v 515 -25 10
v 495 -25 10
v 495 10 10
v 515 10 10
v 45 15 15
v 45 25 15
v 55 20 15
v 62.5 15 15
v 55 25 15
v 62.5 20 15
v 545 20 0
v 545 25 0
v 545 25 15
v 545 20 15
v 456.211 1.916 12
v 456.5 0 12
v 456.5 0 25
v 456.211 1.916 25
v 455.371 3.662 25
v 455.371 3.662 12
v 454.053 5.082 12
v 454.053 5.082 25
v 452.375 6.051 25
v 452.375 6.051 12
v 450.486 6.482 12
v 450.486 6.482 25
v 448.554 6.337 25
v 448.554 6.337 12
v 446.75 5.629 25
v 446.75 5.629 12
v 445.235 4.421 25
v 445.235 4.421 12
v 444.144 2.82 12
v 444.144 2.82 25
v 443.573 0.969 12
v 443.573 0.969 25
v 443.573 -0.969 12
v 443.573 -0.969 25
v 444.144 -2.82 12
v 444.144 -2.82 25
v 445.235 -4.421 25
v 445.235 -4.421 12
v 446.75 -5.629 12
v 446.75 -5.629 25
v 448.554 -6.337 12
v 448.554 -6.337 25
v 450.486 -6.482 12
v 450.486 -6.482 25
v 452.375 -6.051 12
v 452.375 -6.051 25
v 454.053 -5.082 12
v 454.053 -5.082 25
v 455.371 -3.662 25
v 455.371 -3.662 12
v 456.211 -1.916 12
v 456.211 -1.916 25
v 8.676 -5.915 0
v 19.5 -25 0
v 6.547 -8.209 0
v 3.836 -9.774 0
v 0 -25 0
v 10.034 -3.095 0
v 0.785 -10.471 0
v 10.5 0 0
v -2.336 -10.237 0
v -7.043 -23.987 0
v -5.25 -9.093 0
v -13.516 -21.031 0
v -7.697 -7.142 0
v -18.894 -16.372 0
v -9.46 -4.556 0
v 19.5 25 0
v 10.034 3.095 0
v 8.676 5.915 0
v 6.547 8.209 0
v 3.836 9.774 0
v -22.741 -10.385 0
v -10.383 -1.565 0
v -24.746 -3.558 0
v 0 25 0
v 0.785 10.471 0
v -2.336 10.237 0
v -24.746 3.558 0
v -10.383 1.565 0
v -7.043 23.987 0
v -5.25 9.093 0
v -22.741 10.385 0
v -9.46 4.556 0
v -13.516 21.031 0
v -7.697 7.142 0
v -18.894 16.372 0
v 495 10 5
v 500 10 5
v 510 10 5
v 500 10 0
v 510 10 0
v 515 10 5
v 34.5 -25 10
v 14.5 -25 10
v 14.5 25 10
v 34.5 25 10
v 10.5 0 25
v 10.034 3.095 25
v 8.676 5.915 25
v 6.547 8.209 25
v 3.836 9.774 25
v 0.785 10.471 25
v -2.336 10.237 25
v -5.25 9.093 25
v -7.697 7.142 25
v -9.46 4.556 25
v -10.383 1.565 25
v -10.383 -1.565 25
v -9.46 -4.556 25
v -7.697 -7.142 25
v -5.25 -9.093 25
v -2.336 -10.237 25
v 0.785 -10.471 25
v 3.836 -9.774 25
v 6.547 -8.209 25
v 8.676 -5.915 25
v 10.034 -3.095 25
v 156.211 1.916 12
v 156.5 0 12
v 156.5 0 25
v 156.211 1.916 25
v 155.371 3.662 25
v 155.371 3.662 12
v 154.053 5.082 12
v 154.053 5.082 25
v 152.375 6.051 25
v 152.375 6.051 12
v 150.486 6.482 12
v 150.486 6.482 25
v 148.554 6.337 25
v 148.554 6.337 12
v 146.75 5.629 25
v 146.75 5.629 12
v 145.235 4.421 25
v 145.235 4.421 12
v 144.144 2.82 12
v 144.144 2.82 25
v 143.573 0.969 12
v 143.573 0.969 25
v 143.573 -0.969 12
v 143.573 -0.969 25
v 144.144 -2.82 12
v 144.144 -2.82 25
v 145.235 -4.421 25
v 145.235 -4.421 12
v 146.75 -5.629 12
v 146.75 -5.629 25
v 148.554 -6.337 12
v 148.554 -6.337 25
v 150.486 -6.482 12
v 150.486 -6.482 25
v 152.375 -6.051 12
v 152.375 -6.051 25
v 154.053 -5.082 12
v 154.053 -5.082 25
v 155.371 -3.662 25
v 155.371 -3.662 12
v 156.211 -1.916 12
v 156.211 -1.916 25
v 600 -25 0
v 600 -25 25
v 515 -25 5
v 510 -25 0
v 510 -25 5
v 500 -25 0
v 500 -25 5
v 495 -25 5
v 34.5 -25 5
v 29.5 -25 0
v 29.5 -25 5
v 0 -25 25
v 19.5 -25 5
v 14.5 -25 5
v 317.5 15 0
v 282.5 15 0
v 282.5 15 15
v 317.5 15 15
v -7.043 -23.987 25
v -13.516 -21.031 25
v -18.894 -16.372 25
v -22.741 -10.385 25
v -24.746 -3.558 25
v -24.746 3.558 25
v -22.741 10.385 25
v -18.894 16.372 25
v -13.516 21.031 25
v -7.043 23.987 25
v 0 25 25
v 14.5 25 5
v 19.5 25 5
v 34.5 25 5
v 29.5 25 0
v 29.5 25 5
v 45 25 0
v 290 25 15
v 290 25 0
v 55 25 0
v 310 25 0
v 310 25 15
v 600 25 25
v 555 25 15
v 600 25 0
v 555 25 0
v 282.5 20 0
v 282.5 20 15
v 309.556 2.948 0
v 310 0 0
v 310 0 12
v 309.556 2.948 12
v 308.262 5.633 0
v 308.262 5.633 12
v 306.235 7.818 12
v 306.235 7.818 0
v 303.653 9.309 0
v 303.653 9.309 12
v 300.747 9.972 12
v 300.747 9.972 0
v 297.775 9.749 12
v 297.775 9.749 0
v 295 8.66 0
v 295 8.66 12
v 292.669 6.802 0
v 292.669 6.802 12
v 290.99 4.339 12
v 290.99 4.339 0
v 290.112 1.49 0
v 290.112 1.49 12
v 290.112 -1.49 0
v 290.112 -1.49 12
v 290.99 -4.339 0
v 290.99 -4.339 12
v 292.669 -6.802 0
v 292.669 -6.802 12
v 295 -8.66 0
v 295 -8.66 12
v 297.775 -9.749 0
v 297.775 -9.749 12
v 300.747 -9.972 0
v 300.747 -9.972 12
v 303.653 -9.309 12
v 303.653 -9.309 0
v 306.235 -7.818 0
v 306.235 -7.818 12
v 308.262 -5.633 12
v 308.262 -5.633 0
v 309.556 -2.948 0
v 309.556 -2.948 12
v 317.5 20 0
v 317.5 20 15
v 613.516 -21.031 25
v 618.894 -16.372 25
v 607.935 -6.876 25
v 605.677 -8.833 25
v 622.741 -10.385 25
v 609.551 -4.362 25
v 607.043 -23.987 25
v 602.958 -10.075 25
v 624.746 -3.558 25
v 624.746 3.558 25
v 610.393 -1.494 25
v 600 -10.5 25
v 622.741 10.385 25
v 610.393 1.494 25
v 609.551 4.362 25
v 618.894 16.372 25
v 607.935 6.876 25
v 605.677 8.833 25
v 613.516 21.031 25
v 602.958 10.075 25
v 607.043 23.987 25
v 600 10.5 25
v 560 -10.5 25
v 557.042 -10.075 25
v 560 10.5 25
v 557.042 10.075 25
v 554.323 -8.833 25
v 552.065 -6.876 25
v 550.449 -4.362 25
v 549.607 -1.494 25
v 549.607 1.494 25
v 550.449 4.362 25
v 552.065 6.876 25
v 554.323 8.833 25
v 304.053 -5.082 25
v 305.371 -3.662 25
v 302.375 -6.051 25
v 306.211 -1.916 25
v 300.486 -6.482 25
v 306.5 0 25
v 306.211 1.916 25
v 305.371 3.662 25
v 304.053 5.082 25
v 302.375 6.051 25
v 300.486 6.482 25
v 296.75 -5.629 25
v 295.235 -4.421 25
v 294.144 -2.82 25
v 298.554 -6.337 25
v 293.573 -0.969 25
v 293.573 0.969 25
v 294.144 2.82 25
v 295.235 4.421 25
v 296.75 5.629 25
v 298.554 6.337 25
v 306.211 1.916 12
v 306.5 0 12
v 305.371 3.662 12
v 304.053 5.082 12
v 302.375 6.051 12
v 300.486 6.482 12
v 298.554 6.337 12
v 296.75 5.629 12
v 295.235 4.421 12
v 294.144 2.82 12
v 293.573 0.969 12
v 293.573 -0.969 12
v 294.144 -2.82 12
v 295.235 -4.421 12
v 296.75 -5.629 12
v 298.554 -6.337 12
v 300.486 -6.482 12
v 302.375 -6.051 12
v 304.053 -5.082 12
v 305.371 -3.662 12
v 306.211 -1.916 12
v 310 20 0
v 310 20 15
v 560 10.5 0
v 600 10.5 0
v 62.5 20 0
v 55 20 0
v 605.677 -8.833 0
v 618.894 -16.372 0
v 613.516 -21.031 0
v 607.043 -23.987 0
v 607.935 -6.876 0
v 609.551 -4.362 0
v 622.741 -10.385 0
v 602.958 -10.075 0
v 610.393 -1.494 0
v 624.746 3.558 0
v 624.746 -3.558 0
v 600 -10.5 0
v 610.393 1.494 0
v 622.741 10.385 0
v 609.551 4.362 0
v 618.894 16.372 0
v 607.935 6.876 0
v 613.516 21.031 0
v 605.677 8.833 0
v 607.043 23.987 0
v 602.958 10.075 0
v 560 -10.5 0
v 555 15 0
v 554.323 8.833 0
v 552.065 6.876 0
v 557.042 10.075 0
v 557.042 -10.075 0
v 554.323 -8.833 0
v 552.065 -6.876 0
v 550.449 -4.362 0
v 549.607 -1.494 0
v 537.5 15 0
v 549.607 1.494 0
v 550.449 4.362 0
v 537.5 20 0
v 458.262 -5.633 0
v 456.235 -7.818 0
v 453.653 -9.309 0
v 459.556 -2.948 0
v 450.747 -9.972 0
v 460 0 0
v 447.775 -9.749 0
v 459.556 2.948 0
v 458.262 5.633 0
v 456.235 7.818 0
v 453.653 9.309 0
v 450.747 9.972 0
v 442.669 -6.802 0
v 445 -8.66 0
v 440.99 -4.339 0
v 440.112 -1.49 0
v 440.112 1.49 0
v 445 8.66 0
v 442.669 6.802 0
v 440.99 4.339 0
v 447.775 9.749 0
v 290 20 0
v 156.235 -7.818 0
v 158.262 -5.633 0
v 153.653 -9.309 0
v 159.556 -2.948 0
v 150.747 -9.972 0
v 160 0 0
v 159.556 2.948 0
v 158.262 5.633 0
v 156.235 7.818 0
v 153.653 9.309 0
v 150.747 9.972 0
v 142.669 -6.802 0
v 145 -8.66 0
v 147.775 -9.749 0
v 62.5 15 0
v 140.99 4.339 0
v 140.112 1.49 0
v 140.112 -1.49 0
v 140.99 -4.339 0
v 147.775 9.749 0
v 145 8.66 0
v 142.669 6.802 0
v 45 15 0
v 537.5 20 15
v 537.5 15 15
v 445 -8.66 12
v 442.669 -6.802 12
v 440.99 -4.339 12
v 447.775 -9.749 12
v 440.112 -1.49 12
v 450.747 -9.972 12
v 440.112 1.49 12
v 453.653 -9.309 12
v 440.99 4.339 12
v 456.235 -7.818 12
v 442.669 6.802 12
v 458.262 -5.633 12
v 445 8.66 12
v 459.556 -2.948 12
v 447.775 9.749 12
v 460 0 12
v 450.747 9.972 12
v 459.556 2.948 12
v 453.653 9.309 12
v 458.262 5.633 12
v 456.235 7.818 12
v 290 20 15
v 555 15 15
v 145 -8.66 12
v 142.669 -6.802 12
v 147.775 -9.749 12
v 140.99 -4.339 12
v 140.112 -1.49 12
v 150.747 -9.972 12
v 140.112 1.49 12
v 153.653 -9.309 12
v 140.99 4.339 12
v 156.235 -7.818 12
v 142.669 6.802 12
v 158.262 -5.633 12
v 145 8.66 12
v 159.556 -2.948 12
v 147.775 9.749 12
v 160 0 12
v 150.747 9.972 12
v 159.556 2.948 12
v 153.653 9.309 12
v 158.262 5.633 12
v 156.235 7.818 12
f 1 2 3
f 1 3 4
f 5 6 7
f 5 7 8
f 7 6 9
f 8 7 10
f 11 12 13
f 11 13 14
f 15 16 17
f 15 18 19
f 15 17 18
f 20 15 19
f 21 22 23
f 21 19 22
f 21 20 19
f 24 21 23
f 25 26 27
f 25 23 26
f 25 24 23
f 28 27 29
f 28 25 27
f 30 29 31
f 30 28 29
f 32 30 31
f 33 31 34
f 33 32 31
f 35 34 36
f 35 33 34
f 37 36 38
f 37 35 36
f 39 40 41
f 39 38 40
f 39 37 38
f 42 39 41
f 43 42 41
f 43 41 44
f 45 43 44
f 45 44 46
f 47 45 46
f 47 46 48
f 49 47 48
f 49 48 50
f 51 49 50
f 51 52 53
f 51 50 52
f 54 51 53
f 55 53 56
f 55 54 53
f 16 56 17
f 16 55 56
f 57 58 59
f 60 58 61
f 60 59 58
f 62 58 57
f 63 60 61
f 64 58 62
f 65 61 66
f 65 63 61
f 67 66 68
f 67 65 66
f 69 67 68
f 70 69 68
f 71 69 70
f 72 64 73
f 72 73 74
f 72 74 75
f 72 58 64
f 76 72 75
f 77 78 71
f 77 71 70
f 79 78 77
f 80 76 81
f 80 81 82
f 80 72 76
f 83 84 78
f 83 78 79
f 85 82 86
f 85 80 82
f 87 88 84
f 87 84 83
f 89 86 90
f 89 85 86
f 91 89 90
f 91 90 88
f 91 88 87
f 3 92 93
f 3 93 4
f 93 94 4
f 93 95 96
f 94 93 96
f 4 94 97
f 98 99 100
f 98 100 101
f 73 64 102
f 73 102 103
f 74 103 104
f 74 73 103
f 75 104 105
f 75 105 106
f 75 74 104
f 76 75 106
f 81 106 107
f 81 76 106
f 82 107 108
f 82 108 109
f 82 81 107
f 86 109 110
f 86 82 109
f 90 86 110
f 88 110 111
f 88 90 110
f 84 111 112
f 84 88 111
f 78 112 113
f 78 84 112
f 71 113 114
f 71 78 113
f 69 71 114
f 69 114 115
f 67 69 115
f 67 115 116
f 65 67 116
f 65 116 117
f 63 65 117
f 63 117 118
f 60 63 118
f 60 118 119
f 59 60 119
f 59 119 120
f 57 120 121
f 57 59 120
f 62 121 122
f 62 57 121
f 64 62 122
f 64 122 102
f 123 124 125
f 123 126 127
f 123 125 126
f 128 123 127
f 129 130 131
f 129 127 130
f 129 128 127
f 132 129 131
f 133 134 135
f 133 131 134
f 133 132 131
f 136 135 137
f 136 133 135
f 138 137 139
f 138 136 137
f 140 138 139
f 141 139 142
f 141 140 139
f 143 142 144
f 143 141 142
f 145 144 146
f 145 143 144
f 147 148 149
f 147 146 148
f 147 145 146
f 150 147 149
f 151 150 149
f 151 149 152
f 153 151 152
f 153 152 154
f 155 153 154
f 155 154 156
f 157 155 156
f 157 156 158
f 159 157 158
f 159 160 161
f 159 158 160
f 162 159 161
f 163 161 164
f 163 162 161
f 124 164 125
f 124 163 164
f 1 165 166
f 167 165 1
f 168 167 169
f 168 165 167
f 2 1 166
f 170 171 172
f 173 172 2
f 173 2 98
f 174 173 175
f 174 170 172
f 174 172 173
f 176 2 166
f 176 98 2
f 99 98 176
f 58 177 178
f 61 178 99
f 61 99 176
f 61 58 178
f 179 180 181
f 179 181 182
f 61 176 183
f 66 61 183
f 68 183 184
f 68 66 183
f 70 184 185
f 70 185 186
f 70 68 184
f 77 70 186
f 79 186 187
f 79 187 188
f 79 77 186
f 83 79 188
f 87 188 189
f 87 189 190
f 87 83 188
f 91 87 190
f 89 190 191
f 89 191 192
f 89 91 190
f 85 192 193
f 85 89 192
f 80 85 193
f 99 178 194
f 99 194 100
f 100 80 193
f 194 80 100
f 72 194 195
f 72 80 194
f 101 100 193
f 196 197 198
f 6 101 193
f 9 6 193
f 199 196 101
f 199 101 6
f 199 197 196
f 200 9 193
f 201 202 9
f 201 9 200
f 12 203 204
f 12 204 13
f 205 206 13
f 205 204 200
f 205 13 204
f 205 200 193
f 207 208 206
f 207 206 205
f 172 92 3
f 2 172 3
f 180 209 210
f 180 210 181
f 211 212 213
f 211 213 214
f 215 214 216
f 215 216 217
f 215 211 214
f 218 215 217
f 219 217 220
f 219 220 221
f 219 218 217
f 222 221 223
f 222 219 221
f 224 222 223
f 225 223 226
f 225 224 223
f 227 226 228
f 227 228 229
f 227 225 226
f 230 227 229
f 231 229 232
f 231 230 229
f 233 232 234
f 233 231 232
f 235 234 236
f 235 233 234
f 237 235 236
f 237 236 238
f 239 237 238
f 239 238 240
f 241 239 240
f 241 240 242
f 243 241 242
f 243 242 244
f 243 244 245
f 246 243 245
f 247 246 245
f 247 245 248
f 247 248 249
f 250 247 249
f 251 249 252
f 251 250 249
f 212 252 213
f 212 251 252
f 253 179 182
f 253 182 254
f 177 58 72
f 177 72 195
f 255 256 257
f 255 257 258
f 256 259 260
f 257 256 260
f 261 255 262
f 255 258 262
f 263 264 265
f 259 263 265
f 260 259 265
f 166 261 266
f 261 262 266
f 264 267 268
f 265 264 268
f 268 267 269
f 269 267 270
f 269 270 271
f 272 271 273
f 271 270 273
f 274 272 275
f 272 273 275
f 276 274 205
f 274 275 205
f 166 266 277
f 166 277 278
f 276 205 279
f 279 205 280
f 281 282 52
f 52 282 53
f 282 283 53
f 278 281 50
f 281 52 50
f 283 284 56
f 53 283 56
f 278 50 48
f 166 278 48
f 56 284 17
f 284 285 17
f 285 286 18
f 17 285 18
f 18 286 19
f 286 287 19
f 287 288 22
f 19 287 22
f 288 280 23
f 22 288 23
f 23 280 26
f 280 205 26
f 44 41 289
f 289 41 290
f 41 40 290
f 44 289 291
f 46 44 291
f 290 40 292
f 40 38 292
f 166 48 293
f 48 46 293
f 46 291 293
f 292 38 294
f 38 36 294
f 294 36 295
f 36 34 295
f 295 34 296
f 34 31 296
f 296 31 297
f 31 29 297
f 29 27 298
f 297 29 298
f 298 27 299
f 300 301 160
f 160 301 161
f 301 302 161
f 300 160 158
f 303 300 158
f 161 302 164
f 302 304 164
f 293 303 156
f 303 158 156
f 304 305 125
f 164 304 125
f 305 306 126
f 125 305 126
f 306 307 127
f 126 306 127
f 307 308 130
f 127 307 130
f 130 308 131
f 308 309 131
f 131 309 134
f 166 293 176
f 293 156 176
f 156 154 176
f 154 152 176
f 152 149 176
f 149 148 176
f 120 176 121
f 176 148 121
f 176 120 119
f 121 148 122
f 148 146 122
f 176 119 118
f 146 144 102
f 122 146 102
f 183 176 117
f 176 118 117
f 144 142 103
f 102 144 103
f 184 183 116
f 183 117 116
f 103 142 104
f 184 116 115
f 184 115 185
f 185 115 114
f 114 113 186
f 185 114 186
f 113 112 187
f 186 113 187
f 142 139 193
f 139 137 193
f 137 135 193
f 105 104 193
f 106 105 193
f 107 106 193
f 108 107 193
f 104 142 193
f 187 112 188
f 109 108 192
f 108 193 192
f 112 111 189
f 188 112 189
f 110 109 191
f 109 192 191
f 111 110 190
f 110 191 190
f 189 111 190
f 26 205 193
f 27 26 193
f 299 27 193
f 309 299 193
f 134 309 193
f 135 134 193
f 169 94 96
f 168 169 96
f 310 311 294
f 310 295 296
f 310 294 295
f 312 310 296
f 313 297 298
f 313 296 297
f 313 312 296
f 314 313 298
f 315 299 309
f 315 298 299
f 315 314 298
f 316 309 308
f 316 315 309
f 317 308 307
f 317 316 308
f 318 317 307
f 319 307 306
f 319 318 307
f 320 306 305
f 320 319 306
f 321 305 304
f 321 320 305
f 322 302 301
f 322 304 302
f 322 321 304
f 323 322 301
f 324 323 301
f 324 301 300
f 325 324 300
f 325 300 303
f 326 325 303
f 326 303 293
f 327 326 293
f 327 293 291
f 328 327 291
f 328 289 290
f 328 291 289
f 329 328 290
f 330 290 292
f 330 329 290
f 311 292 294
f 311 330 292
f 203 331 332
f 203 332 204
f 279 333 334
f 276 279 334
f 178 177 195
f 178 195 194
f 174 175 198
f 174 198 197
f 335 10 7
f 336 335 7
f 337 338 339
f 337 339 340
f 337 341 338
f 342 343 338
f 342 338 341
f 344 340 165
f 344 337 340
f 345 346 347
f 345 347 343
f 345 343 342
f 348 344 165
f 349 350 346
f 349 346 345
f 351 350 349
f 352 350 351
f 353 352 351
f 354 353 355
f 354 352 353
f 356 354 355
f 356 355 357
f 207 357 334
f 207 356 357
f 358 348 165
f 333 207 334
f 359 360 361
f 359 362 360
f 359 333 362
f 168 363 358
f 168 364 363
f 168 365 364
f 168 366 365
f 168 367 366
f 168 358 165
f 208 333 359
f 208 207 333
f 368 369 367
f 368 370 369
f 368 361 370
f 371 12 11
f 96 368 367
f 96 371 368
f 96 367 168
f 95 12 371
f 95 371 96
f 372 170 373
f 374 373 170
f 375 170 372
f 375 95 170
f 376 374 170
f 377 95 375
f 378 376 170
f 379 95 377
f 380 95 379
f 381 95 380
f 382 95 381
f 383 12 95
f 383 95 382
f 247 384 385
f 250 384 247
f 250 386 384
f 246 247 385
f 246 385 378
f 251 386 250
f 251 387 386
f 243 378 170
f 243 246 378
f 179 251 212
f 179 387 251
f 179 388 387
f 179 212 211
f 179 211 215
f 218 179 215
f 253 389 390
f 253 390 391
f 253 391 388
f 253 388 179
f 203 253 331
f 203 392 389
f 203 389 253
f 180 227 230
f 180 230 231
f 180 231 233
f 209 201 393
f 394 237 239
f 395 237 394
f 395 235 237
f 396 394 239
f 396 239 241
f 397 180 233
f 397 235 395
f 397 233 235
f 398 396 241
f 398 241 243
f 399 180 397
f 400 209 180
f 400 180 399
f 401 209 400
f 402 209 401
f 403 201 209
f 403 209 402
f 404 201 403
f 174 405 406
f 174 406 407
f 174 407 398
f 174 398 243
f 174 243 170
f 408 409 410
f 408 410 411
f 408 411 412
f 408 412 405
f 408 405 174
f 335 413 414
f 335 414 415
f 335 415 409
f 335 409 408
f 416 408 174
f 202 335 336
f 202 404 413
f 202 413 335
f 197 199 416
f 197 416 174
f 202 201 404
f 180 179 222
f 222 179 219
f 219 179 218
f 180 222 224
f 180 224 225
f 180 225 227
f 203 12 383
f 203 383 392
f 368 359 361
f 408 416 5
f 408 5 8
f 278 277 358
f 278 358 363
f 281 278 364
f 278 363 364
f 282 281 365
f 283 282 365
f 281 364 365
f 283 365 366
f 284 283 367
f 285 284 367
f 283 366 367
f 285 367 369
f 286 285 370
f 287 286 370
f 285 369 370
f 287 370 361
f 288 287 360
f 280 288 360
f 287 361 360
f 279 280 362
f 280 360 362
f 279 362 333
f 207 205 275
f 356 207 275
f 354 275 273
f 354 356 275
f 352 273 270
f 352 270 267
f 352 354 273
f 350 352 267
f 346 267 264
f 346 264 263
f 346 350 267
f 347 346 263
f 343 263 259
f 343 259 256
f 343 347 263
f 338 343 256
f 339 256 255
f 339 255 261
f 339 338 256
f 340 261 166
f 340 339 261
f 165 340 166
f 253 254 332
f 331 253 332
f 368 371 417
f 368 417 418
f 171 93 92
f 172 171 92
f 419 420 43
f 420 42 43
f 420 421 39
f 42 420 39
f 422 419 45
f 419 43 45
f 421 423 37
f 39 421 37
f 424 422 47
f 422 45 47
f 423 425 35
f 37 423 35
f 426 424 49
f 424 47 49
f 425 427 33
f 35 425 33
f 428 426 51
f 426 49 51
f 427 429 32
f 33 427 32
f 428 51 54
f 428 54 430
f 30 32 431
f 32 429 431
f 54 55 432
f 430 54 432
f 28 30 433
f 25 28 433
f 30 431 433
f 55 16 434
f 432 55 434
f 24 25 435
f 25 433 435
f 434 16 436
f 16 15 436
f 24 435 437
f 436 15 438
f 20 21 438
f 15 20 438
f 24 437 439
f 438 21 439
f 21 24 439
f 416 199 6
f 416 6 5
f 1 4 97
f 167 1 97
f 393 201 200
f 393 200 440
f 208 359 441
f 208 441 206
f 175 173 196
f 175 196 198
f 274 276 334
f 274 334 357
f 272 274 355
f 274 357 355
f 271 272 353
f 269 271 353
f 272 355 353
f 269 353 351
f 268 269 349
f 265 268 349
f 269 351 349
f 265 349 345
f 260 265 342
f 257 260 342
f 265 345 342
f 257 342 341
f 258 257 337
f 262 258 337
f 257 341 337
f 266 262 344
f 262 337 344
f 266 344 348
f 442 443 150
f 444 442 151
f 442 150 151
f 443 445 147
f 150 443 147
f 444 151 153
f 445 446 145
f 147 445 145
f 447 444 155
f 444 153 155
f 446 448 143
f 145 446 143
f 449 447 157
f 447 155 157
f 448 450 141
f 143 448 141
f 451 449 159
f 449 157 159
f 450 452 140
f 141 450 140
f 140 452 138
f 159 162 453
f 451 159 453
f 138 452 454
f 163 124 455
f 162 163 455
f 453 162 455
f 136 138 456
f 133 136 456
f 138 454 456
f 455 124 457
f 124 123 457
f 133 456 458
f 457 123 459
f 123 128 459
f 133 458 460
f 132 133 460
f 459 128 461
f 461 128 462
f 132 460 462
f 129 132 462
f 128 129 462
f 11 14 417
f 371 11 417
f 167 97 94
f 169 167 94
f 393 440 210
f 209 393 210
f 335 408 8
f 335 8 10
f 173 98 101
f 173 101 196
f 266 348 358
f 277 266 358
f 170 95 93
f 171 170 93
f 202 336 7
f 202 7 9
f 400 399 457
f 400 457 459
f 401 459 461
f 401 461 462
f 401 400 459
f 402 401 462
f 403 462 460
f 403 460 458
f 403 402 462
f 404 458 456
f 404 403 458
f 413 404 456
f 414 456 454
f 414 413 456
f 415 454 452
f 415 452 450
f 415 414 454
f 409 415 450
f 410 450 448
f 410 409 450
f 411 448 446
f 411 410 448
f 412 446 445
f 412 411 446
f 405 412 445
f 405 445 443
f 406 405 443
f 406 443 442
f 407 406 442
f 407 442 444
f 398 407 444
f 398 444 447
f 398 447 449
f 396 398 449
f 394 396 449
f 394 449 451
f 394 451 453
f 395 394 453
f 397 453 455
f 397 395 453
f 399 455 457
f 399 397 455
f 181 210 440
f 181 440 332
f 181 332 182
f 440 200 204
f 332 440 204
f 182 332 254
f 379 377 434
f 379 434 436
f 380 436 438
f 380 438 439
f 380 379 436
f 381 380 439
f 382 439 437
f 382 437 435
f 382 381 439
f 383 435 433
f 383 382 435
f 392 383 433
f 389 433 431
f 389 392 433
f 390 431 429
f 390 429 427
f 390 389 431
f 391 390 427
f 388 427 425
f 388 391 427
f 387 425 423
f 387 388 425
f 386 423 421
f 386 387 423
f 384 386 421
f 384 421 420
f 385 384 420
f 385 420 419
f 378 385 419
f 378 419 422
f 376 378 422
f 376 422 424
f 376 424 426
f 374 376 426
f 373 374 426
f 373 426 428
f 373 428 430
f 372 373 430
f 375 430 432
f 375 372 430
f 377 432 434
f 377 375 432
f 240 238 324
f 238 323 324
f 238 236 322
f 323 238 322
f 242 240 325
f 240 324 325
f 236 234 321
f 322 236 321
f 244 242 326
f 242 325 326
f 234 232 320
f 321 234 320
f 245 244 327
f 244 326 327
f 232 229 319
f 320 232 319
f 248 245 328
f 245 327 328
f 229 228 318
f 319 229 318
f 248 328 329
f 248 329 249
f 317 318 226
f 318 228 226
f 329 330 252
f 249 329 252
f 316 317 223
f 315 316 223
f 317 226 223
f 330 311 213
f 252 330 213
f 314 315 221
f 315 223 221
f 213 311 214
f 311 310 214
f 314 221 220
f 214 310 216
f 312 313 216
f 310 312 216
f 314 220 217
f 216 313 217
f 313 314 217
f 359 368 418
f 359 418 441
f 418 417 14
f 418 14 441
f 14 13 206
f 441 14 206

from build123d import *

# Parameters (mm, degrees)
ESQUISSE1_R                  = 10.5
BOSS_EXTRU_1_DEPTH           = 25
ENL_V_START                  = -15
ENL_V_MAT_EXTRU_1_DEPTH      = 35
ENL_V_MAT_EXTRU_2_DEPTH      = 50
ENL_V_MAT_EXTRU_3_DEPTH      = 15
ESQUISSE1_4_R                = 6.500000002
ENL_V_MAT_EXTRU_4_DEPTH      = 26
ENL_V_MAT_EXTRU_4_DEPTH_BACK = 1
ESQUISSE1_5_R                = 10.000000002
ENL_V_MAT_EXTRU_5_DEPTH      = 12


with BuildPart() as part:
    # Esquisse1 → Boss.-Extru.1 (new body)
    with BuildSketch(Plane.XY):
        with BuildLine():
            Line((600, -25), (0, -25))
            ThreePointArc((0, -25), (-25, 0), (0, 25))
            Line((0, 25), (600, 25))
            ThreePointArc((600, 25), (625, 0), (600, -25))
        make_face()
        Circle(ESQUISSE1_R, mode=Mode.SUBTRACT)
        with BuildLine():
            Line((560, 10.5), (600, 10.5))
            ThreePointArc((600, 10.5), (610.5, 0), (600, -10.5))
            Line((600, -10.5), (560, -10.5))
            ThreePointArc((560, -10.5), (549.5, 0), (560, 10.5))
        make_face(mode=Mode.SUBTRACT)
    extrude(amount=BOSS_EXTRU_1_DEPTH)

    # Esquisse2 → Enl_v. mat.-Extru.1 (cut)
    with BuildSketch(Plane(origin=(0, 25, 0), x_dir=(1, 0, 0), z_dir=(0, 1, 0)).offset(ENL_V_START)):
        Polygon((510, 0), (500, 0), (500, -5), (495, -5), (495, -10), (515, -10), (515, -5), (510, -5), align=None)
    extrude(amount=-ENL_V_MAT_EXTRU_1_DEPTH, mode=Mode.SUBTRACT)

    # Esquisse3 → Enl_v. mat.-Extru.2 (cut)
    with BuildSketch(Plane.XZ.offset(25)):
        Polygon((19.5, 0), (19.5, 5), (14.5, 5), (14.5, 10), (34.5, 10), (34.5, 5), (29.5, 5), (29.5, 0), align=None)
    extrude(amount=-ENL_V_MAT_EXTRU_2_DEPTH, mode=Mode.SUBTRACT)

    # Esquisse1_3 → Enl_v. mat.-Extru.3 (cut)
    with BuildSketch(Plane.XY):
        Polygon((55, 25), (45, 25), (45, 15), (62.5, 15), (62.5, 20), (55, 20), align=None)
        Polygon((310, 20), (310, 25), (290, 25), (290, 20), (282.5, 20), (282.5, 15), (317.5, 15), (317.5, 20), align=None)
        Polygon((555, 15), (555, 25), (545, 25), (545, 20), (537.5, 20), (537.5, 15), align=None)
    extrude(amount=ENL_V_MAT_EXTRU_3_DEPTH, mode=Mode.SUBTRACT)

    # Esquisse1_4 → Enl_v. mat.-Extru.4 (cut, two sides)
    with BuildSketch(Plane.XY) as enl_v_mat_extru_4_sk:
        with Locations((300, 0)):
            Circle(ESQUISSE1_4_R)
        with Locations((450, 0)):
            Circle(ESQUISSE1_4_R)
        with Locations((150, 0)):
            Circle(ESQUISSE1_4_R)
    extrude(amount=ENL_V_MAT_EXTRU_4_DEPTH, mode=Mode.SUBTRACT)
    extrude(enl_v_mat_extru_4_sk.sketch, amount=-ENL_V_MAT_EXTRU_4_DEPTH_BACK, mode=Mode.SUBTRACT)

    # Esquisse1_5 → Enl_v. mat.-Extru.5 (cut)
    with BuildSketch(Plane.XY):
        with Locations((300, 0)):
            Circle(ESQUISSE1_5_R)
        with Locations((450, 0)):
            Circle(ESQUISSE1_5_R)
        with Locations((150, 0)):
            Circle(ESQUISSE1_5_R)
    extrude(amount=ENL_V_MAT_EXTRU_5_DEPTH, mode=Mode.SUBTRACT)


solid = part.part
